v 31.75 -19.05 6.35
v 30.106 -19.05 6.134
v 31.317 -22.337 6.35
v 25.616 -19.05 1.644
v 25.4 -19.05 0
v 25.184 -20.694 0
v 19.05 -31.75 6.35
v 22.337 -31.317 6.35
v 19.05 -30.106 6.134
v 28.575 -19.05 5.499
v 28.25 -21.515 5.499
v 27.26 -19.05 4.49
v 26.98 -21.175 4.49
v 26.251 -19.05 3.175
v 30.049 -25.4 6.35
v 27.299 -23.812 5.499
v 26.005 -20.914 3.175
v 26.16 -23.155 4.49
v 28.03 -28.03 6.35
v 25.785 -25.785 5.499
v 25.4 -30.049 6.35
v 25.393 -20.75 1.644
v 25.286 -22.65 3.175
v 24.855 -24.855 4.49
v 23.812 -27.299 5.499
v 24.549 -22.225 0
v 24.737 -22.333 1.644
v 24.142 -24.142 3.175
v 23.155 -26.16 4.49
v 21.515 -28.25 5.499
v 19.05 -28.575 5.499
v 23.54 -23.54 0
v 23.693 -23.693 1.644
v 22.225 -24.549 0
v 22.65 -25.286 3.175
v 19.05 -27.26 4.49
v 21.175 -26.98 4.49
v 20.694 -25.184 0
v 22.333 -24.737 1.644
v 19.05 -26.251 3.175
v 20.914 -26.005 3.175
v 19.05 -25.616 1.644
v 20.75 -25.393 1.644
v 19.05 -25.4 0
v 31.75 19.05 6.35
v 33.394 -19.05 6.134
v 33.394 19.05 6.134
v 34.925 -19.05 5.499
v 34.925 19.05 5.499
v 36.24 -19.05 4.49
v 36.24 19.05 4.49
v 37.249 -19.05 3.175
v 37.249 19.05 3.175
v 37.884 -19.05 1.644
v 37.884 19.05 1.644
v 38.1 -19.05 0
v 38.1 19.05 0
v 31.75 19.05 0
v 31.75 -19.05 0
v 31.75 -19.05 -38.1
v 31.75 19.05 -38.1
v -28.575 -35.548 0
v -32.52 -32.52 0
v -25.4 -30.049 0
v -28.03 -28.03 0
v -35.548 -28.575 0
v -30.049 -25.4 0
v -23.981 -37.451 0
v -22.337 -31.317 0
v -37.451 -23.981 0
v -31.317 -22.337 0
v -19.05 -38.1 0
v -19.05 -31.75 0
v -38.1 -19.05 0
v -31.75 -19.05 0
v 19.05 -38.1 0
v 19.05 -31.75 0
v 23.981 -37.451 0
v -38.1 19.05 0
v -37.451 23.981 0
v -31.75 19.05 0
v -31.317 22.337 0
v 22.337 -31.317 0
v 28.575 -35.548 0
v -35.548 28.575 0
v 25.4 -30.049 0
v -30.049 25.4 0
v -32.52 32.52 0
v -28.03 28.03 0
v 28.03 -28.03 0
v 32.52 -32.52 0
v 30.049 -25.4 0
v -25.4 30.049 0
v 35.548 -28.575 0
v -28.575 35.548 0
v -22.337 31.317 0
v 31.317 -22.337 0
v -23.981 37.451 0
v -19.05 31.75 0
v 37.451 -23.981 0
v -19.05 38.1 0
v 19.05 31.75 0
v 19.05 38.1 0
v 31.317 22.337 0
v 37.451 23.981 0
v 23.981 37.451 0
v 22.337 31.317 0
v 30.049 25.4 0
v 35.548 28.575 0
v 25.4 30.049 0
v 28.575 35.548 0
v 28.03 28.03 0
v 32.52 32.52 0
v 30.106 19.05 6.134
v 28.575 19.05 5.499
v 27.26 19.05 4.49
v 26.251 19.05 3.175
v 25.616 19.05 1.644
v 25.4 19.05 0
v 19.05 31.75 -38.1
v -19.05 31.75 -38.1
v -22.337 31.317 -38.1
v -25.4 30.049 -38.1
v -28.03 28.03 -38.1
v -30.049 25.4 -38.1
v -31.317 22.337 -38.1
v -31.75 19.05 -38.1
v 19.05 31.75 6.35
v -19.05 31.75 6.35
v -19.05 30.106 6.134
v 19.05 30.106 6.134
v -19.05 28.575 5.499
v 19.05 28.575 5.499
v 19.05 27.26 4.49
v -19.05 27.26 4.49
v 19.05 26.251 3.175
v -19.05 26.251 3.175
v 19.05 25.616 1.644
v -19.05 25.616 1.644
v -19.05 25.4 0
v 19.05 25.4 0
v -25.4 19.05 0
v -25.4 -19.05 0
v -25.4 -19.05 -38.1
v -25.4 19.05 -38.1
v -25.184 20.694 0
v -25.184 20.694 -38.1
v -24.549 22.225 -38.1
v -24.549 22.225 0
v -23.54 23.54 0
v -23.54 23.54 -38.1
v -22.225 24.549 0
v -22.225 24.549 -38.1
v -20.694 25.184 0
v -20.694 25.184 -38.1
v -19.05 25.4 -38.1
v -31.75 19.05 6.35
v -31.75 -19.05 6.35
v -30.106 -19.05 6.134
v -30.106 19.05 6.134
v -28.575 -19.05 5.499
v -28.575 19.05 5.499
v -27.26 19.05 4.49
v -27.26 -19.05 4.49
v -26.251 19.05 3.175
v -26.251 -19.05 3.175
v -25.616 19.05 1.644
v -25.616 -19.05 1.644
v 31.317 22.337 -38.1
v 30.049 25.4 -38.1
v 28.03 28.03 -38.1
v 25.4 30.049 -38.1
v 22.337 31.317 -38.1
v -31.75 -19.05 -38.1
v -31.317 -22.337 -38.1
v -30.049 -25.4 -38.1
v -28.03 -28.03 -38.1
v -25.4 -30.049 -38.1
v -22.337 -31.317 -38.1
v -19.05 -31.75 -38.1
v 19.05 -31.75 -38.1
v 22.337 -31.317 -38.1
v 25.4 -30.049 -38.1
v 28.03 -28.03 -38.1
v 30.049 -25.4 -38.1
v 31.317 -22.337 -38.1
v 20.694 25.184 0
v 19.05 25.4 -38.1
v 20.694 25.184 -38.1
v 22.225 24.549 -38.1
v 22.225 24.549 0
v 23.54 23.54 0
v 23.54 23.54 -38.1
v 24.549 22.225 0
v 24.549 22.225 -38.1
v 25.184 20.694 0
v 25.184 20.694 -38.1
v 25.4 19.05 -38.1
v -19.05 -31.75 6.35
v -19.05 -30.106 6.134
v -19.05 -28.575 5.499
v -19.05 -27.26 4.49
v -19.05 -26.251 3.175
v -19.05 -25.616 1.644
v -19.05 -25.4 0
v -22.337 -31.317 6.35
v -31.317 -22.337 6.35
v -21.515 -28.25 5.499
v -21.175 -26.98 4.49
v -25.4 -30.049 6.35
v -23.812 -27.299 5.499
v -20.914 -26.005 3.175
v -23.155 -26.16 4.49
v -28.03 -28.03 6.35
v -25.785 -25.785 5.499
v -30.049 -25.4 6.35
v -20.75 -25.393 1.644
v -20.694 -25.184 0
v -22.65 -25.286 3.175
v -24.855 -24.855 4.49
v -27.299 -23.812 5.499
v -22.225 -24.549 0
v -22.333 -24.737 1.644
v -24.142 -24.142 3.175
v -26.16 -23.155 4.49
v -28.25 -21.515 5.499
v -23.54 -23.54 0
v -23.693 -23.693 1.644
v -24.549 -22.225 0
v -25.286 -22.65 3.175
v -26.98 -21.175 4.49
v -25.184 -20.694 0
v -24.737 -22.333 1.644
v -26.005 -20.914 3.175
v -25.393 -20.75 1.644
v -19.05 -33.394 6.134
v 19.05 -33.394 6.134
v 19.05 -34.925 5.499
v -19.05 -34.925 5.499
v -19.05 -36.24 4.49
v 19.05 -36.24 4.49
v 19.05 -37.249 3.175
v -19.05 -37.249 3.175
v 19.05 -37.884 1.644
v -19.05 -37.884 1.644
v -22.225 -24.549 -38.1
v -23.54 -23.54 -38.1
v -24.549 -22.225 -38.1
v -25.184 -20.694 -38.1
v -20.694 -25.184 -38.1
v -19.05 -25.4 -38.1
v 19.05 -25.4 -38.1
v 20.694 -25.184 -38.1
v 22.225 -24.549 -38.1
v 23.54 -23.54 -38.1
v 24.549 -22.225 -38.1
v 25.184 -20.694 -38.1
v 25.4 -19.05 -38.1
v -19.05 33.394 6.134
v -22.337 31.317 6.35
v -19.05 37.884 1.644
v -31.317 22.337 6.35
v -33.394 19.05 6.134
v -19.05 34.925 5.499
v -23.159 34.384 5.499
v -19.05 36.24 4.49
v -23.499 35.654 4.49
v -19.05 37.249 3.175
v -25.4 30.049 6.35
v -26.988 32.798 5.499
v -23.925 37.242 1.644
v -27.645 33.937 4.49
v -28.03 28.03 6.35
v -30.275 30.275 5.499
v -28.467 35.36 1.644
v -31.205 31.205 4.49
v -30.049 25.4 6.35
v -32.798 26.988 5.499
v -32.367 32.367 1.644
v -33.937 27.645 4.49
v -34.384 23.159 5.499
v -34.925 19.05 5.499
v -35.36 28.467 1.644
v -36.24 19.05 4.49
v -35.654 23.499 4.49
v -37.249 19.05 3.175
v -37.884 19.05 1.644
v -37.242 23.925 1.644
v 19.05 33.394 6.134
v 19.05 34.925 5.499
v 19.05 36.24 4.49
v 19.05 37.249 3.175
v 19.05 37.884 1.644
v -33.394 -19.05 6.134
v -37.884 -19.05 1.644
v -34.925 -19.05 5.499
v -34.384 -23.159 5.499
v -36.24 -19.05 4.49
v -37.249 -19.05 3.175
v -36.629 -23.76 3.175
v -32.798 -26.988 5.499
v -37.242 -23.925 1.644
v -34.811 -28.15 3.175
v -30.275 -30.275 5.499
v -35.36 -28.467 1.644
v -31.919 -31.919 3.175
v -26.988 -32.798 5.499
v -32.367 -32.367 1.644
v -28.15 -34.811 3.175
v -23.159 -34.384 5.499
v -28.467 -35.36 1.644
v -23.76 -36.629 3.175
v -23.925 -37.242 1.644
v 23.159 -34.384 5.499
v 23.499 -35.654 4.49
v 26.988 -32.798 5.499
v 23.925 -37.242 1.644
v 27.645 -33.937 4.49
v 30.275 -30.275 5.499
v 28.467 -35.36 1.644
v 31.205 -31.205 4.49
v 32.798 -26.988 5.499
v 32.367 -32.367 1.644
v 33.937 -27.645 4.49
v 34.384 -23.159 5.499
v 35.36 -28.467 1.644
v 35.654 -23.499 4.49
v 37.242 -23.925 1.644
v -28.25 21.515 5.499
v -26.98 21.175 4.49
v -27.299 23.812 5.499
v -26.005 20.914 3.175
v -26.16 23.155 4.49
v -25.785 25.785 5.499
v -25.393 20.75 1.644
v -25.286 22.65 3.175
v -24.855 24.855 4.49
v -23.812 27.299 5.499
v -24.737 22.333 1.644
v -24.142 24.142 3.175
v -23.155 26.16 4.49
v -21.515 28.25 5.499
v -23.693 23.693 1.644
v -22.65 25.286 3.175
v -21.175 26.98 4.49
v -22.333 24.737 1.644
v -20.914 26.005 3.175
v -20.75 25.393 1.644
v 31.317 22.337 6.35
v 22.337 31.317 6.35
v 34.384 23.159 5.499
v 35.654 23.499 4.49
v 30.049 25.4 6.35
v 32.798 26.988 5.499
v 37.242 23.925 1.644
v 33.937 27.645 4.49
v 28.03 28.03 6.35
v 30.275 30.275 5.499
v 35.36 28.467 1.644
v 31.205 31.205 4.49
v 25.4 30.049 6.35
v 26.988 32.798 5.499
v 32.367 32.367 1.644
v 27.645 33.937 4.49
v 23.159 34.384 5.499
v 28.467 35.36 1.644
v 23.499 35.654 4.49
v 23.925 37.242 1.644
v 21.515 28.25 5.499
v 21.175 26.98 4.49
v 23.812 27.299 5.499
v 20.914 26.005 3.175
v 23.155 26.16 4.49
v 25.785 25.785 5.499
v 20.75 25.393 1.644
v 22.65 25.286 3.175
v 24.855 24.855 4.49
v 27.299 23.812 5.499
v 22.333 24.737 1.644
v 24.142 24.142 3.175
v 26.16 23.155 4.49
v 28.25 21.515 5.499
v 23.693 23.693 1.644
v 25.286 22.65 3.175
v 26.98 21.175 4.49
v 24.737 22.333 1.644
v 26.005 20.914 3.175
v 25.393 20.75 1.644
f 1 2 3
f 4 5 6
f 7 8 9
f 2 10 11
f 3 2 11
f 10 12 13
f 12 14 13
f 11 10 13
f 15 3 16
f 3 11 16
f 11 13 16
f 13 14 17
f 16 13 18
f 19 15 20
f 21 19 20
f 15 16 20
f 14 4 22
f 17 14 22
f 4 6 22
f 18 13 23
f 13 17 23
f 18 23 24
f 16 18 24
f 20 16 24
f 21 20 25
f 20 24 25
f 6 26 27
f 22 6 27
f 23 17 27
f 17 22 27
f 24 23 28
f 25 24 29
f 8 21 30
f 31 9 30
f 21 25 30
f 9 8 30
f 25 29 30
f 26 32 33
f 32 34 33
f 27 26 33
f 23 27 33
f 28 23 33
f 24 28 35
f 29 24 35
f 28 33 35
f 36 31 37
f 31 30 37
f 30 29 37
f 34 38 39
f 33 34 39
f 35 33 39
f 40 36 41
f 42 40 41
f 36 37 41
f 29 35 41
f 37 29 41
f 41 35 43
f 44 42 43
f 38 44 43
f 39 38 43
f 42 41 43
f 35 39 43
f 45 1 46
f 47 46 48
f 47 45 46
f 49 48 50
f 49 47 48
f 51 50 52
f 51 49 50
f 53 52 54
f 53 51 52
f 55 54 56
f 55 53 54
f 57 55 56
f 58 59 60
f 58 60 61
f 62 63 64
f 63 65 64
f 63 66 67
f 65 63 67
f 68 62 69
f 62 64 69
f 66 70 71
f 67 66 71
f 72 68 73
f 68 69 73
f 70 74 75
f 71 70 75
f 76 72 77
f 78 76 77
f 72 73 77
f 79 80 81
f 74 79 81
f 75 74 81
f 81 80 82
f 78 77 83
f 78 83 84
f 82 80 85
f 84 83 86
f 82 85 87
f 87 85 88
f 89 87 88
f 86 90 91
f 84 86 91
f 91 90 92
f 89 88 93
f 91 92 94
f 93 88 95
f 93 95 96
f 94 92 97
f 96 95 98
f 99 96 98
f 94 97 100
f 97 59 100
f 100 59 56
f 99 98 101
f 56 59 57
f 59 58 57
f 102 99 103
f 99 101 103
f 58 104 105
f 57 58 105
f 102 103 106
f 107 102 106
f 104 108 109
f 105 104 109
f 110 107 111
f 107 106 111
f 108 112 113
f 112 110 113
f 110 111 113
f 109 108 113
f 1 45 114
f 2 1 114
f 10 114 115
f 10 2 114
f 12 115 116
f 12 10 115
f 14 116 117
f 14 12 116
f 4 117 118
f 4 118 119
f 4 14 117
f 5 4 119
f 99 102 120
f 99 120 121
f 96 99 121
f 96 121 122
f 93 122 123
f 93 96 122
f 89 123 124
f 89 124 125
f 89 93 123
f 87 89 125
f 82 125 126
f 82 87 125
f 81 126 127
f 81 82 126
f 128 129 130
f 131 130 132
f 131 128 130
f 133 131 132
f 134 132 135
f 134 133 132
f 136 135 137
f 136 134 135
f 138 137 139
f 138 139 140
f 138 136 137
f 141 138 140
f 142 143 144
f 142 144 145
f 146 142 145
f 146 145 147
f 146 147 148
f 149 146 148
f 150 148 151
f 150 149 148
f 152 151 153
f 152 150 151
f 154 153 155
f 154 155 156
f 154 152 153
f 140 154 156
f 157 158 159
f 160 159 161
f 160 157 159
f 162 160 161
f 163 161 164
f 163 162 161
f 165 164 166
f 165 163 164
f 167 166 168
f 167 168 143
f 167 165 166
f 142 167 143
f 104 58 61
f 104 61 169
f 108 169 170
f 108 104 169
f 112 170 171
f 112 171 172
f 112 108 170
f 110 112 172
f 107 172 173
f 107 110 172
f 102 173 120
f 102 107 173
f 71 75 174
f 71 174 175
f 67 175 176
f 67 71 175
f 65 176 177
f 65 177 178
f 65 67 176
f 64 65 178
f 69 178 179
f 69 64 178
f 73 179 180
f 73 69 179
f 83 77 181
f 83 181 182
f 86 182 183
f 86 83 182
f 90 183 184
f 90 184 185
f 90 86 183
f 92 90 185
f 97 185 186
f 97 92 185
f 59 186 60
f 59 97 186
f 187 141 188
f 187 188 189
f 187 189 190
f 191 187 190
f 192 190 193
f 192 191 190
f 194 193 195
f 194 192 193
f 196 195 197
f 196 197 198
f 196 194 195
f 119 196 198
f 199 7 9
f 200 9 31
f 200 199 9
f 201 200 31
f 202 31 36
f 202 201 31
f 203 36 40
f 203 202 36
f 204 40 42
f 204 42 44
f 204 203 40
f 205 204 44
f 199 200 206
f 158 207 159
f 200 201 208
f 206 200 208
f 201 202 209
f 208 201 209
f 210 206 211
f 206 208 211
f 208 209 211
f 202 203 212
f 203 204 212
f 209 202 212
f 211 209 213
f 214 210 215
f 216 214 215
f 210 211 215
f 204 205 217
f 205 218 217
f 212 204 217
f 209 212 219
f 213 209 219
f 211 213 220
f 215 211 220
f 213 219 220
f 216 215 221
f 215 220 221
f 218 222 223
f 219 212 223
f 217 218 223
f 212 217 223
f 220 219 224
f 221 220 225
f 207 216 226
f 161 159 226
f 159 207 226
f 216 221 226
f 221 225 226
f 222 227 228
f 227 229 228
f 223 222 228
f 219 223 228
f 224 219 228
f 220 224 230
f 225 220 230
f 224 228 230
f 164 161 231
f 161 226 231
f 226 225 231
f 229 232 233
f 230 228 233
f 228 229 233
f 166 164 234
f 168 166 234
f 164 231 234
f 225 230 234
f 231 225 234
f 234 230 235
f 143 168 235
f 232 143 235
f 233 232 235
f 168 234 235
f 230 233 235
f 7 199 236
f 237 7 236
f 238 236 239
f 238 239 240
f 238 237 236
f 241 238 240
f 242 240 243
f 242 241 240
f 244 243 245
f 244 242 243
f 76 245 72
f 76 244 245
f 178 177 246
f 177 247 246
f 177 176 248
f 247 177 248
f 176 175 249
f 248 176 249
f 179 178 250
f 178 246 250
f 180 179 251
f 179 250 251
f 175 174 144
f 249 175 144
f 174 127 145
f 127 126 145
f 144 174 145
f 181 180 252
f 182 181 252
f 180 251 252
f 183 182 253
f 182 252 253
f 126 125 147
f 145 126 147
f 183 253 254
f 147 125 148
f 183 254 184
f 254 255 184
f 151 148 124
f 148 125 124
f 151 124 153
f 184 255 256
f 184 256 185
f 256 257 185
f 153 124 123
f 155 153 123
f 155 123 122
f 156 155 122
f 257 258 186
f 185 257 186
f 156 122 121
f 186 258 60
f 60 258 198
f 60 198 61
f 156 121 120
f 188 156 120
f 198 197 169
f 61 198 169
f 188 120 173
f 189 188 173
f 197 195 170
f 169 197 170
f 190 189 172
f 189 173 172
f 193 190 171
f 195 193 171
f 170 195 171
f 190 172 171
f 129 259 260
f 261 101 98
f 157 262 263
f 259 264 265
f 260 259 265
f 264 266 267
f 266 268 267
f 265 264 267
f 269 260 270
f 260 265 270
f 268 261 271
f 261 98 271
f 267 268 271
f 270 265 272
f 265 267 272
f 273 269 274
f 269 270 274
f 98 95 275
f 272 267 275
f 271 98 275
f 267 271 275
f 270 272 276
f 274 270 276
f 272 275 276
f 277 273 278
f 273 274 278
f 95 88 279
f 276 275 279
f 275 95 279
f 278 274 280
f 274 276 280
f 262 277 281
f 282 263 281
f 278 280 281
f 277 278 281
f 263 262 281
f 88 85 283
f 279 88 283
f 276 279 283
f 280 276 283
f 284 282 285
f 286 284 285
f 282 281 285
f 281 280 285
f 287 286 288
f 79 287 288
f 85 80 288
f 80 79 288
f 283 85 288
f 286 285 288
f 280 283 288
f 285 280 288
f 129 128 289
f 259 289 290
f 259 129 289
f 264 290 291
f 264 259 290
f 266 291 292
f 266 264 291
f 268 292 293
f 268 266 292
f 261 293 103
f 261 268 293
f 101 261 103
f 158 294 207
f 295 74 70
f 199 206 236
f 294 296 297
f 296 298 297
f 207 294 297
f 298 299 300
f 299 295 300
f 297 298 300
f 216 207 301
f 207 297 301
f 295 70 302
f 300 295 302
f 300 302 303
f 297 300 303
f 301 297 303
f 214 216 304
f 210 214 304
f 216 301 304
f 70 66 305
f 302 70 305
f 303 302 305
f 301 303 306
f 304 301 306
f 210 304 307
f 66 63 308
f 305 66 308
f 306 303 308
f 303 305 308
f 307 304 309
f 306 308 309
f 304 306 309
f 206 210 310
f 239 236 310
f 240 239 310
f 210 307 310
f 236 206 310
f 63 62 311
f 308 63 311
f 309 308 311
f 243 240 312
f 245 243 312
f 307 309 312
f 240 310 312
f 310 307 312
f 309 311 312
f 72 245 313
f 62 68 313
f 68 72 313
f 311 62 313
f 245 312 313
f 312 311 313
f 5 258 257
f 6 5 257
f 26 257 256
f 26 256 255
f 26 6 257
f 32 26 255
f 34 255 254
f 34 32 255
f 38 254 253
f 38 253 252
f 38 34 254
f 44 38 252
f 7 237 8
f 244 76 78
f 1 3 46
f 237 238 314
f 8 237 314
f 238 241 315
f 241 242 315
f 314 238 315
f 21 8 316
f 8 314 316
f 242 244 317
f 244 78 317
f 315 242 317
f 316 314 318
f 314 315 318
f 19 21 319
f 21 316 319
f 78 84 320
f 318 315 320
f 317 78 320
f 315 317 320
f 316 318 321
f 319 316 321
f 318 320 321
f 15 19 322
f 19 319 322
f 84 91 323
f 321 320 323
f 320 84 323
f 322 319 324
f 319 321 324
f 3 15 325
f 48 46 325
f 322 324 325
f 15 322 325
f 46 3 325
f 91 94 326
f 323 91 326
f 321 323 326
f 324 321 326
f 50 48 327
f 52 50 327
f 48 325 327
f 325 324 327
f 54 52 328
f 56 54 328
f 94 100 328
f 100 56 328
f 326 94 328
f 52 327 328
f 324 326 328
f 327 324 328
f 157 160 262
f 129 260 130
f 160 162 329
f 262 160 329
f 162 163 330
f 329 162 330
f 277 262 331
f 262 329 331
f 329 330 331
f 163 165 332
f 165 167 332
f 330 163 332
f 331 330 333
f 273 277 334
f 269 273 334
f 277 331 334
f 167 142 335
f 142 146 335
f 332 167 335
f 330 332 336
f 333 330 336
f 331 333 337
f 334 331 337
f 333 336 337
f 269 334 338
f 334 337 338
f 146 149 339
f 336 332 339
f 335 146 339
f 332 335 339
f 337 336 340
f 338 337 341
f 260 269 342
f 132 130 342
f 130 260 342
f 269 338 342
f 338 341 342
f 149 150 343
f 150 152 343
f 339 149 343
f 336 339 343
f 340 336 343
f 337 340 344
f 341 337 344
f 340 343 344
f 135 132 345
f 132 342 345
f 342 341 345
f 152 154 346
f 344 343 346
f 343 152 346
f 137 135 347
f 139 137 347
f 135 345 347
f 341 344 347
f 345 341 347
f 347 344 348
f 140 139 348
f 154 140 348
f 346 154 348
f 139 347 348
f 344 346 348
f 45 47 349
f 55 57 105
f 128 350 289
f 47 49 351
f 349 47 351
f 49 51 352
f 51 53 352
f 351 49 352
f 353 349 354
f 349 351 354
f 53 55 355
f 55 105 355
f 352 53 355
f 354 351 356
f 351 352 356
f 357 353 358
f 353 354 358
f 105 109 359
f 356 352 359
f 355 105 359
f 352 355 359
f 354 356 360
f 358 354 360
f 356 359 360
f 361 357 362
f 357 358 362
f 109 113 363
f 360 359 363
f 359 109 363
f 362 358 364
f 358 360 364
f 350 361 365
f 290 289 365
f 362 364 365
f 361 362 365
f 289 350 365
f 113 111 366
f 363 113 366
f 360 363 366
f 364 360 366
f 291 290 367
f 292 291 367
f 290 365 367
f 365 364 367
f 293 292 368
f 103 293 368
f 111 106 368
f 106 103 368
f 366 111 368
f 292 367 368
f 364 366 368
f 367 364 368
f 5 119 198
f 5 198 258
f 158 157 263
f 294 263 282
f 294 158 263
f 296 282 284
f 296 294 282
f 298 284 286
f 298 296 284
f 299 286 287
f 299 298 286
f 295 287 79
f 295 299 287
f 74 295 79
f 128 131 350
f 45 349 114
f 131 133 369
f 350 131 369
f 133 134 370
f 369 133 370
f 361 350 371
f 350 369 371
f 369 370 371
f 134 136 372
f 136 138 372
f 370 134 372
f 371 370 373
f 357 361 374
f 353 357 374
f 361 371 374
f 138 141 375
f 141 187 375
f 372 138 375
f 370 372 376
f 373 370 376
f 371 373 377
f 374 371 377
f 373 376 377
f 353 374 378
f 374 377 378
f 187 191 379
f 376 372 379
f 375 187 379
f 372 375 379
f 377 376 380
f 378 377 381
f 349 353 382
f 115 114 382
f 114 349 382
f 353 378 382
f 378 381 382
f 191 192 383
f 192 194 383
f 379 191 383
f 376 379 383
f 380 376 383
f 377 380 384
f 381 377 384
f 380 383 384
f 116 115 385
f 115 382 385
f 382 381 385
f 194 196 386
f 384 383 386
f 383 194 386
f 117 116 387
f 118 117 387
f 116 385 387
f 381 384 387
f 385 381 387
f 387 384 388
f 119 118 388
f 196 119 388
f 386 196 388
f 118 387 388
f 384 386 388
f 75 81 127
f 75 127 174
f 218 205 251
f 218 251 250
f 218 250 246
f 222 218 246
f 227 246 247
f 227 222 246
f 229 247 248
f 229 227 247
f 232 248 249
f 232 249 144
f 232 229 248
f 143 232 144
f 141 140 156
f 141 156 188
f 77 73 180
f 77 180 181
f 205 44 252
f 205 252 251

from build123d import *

# Parameters (mm, degrees)
F1_DEPTH = 6.35
F2_DEPTH = 38.1
F3_R     = 6.34999


# Not quite as in the source:
# - a fillet or chamfer is up to 0.001 mm smaller than in the source, because OpenCascade refuses the exact size


with BuildPart() as f1:
    # F0 (on Top) → F1 (new body)
    with BuildSketch(Plane.XY):
        with BuildLine():
            Line((-19.05, -38.1000031829), (19.05, -38.1000031829))
            ThreePointArc((19.05, -38.1000031829), (32.5203864322, -32.5203864322), (38.1000031829, -19.05))
            Line((38.1000031829, -19.05), (38.1000031829, 19.05))
            ThreePointArc((38.1000031829, 19.05), (32.5203864322, 32.5203864322), (19.05, 38.1000031829))
            Line((19.05, 38.1000031829), (-19.05, 38.1000031829))
            ThreePointArc((-19.05, 38.1000031829), (-32.5203864322, 32.5203864322), (-38.1000031829, 19.05))
            Line((-38.1000031829, 19.05), (-38.1000031829, -19.05))
            ThreePointArc((-38.1000031829, -19.05), (-32.5203864322, -32.5203864322), (-19.05, -38.1000031829))
        make_face()
        with BuildLine():
            ThreePointArc((-19.05, -31.75), (-28.0302561211, -28.0302561211), (-31.75, -19.05))
            Line((-31.75, -19.05), (-31.75, 19.05))
            ThreePointArc((-31.75, 19.05), (-28.0302561211, 28.0302561211), (-19.05, 31.75))
            Line((-19.05, 31.75), (19.05, 31.75))
            ThreePointArc((19.05, 31.75), (28.0302561211, 28.0302561211), (31.75, 19.05))
            Line((31.75, 19.05), (31.75, -19.05))
            ThreePointArc((31.75, -19.05), (28.0302561211, -28.0302561211), (19.05, -31.75))
            Line((19.05, -31.75), (-19.05, -31.75))
        make_face(mode=Mode.SUBTRACT)
        with BuildLine():
            Line((-31.75, 19.05), (-31.75, -19.05))
            ThreePointArc((-31.75, -19.05), (-28.0302561211, -28.0302561211), (-19.05, -31.75))
            Line((-19.05, -31.75), (19.05, -31.75))
            ThreePointArc((19.05, -31.75), (28.0302561211, -28.0302561211), (31.75, -19.05))
            Line((31.75, -19.05), (31.75, 19.05))
            ThreePointArc((31.75, 19.05), (28.0302561211, 28.0302561211), (19.05, 31.75))
            Line((19.05, 31.75), (-19.05, 31.75))
            ThreePointArc((-19.05, 31.75), (-28.0302561211, 28.0302561211), (-31.75, 19.05))
        make_face()
        with BuildLine():
            Line((19.05, -25.4), (-19.05, -25.4))
            ThreePointArc((-19.05, -25.4), (-23.5401280605, -23.5401280605), (-25.4, -19.05))
            Line((-25.4, -19.05), (-25.4, 19.05))
            ThreePointArc((-25.4, 19.05), (-23.5401280605, 23.5401280605), (-19.05, 25.4))
            Line((-19.05, 25.4), (19.05, 25.4))
            ThreePointArc((19.05, 25.4), (23.5401280605, 23.5401280605), (25.4, 19.05))
            Line((25.4, 19.05), (25.4, -19.05))
            ThreePointArc((25.4, -19.05), (23.5401280605, -23.5401280605), (19.05, -25.4))
        make_face(mode=Mode.SUBTRACT)
    extrude(amount=F1_DEPTH)

    # F0 (on Top) → F2 (join)
    with BuildSketch(Plane.XY):
        with BuildLine():
            Line((-31.75, 19.05), (-31.75, -19.05))
            ThreePointArc((-31.75, -19.05), (-28.0302561211, -28.0302561211), (-19.05, -31.75))
            Line((-19.05, -31.75), (19.05, -31.75))
            ThreePointArc((19.05, -31.75), (28.0302561211, -28.0302561211), (31.75, -19.05))
            Line((31.75, -19.05), (31.75, 19.05))
            ThreePointArc((31.75, 19.05), (28.0302561211, 28.0302561211), (19.05, 31.75))
            Line((19.05, 31.75), (-19.05, 31.75))
            ThreePointArc((-19.05, 31.75), (-28.0302561211, 28.0302561211), (-31.75, 19.05))
        make_face()
        with BuildLine():
            Line((19.05, -25.4), (-19.05, -25.4))
            ThreePointArc((-19.05, -25.4), (-23.5401280605, -23.5401280605), (-25.4, -19.05))
            Line((-25.4, -19.05), (-25.4, 19.05))
            ThreePointArc((-25.4, 19.05), (-23.5401280605, 23.5401280605), (-19.05, 25.4))
            Line((-19.05, 25.4), (19.05, 25.4))
            ThreePointArc((19.05, 25.4), (23.5401280605, 23.5401280605), (25.4, 19.05))
            Line((25.4, 19.05), (25.4, -19.05))
            ThreePointArc((25.4, -19.05), (23.5401280605, -23.5401280605), (19.05, -25.4))
        make_face(mode=Mode.SUBTRACT)
    extrude(amount=-F2_DEPTH)

    # F3 (radius 6.35 in the source; OpenCascade refuses exactly that, so slightly less here)
    f3_edges = [f1.edges().sort_by_distance(p)[0] for p in [
        (23.540128, -23.540128, 6.35),
        (0, -25.4, 6.35),
        (-23.540128, -23.540128, 6.35),
        (-25.4, 0, 6.35),
        (-23.540128, 23.540128, 6.35),
        (0, 25.4, 6.35),
        (23.540128, 23.540128, 6.35),
        (25.4, 0, 6.35),
        (0, -38.100003, 6.35),
        (32.520386, -32.520386, 6.35),
        (38.100003, 0, 6.35),
        (32.520386, 32.520386, 6.35),
        (0, 38.100003, 6.35),
        (-32.520386, 32.520386, 6.35),
        (-38.100003, 0, 6.35),
        (-32.520386, -32.520386, 6.35),
    ]]
    fillet(f3_edges, radius=F3_R)


solid = f1.part
